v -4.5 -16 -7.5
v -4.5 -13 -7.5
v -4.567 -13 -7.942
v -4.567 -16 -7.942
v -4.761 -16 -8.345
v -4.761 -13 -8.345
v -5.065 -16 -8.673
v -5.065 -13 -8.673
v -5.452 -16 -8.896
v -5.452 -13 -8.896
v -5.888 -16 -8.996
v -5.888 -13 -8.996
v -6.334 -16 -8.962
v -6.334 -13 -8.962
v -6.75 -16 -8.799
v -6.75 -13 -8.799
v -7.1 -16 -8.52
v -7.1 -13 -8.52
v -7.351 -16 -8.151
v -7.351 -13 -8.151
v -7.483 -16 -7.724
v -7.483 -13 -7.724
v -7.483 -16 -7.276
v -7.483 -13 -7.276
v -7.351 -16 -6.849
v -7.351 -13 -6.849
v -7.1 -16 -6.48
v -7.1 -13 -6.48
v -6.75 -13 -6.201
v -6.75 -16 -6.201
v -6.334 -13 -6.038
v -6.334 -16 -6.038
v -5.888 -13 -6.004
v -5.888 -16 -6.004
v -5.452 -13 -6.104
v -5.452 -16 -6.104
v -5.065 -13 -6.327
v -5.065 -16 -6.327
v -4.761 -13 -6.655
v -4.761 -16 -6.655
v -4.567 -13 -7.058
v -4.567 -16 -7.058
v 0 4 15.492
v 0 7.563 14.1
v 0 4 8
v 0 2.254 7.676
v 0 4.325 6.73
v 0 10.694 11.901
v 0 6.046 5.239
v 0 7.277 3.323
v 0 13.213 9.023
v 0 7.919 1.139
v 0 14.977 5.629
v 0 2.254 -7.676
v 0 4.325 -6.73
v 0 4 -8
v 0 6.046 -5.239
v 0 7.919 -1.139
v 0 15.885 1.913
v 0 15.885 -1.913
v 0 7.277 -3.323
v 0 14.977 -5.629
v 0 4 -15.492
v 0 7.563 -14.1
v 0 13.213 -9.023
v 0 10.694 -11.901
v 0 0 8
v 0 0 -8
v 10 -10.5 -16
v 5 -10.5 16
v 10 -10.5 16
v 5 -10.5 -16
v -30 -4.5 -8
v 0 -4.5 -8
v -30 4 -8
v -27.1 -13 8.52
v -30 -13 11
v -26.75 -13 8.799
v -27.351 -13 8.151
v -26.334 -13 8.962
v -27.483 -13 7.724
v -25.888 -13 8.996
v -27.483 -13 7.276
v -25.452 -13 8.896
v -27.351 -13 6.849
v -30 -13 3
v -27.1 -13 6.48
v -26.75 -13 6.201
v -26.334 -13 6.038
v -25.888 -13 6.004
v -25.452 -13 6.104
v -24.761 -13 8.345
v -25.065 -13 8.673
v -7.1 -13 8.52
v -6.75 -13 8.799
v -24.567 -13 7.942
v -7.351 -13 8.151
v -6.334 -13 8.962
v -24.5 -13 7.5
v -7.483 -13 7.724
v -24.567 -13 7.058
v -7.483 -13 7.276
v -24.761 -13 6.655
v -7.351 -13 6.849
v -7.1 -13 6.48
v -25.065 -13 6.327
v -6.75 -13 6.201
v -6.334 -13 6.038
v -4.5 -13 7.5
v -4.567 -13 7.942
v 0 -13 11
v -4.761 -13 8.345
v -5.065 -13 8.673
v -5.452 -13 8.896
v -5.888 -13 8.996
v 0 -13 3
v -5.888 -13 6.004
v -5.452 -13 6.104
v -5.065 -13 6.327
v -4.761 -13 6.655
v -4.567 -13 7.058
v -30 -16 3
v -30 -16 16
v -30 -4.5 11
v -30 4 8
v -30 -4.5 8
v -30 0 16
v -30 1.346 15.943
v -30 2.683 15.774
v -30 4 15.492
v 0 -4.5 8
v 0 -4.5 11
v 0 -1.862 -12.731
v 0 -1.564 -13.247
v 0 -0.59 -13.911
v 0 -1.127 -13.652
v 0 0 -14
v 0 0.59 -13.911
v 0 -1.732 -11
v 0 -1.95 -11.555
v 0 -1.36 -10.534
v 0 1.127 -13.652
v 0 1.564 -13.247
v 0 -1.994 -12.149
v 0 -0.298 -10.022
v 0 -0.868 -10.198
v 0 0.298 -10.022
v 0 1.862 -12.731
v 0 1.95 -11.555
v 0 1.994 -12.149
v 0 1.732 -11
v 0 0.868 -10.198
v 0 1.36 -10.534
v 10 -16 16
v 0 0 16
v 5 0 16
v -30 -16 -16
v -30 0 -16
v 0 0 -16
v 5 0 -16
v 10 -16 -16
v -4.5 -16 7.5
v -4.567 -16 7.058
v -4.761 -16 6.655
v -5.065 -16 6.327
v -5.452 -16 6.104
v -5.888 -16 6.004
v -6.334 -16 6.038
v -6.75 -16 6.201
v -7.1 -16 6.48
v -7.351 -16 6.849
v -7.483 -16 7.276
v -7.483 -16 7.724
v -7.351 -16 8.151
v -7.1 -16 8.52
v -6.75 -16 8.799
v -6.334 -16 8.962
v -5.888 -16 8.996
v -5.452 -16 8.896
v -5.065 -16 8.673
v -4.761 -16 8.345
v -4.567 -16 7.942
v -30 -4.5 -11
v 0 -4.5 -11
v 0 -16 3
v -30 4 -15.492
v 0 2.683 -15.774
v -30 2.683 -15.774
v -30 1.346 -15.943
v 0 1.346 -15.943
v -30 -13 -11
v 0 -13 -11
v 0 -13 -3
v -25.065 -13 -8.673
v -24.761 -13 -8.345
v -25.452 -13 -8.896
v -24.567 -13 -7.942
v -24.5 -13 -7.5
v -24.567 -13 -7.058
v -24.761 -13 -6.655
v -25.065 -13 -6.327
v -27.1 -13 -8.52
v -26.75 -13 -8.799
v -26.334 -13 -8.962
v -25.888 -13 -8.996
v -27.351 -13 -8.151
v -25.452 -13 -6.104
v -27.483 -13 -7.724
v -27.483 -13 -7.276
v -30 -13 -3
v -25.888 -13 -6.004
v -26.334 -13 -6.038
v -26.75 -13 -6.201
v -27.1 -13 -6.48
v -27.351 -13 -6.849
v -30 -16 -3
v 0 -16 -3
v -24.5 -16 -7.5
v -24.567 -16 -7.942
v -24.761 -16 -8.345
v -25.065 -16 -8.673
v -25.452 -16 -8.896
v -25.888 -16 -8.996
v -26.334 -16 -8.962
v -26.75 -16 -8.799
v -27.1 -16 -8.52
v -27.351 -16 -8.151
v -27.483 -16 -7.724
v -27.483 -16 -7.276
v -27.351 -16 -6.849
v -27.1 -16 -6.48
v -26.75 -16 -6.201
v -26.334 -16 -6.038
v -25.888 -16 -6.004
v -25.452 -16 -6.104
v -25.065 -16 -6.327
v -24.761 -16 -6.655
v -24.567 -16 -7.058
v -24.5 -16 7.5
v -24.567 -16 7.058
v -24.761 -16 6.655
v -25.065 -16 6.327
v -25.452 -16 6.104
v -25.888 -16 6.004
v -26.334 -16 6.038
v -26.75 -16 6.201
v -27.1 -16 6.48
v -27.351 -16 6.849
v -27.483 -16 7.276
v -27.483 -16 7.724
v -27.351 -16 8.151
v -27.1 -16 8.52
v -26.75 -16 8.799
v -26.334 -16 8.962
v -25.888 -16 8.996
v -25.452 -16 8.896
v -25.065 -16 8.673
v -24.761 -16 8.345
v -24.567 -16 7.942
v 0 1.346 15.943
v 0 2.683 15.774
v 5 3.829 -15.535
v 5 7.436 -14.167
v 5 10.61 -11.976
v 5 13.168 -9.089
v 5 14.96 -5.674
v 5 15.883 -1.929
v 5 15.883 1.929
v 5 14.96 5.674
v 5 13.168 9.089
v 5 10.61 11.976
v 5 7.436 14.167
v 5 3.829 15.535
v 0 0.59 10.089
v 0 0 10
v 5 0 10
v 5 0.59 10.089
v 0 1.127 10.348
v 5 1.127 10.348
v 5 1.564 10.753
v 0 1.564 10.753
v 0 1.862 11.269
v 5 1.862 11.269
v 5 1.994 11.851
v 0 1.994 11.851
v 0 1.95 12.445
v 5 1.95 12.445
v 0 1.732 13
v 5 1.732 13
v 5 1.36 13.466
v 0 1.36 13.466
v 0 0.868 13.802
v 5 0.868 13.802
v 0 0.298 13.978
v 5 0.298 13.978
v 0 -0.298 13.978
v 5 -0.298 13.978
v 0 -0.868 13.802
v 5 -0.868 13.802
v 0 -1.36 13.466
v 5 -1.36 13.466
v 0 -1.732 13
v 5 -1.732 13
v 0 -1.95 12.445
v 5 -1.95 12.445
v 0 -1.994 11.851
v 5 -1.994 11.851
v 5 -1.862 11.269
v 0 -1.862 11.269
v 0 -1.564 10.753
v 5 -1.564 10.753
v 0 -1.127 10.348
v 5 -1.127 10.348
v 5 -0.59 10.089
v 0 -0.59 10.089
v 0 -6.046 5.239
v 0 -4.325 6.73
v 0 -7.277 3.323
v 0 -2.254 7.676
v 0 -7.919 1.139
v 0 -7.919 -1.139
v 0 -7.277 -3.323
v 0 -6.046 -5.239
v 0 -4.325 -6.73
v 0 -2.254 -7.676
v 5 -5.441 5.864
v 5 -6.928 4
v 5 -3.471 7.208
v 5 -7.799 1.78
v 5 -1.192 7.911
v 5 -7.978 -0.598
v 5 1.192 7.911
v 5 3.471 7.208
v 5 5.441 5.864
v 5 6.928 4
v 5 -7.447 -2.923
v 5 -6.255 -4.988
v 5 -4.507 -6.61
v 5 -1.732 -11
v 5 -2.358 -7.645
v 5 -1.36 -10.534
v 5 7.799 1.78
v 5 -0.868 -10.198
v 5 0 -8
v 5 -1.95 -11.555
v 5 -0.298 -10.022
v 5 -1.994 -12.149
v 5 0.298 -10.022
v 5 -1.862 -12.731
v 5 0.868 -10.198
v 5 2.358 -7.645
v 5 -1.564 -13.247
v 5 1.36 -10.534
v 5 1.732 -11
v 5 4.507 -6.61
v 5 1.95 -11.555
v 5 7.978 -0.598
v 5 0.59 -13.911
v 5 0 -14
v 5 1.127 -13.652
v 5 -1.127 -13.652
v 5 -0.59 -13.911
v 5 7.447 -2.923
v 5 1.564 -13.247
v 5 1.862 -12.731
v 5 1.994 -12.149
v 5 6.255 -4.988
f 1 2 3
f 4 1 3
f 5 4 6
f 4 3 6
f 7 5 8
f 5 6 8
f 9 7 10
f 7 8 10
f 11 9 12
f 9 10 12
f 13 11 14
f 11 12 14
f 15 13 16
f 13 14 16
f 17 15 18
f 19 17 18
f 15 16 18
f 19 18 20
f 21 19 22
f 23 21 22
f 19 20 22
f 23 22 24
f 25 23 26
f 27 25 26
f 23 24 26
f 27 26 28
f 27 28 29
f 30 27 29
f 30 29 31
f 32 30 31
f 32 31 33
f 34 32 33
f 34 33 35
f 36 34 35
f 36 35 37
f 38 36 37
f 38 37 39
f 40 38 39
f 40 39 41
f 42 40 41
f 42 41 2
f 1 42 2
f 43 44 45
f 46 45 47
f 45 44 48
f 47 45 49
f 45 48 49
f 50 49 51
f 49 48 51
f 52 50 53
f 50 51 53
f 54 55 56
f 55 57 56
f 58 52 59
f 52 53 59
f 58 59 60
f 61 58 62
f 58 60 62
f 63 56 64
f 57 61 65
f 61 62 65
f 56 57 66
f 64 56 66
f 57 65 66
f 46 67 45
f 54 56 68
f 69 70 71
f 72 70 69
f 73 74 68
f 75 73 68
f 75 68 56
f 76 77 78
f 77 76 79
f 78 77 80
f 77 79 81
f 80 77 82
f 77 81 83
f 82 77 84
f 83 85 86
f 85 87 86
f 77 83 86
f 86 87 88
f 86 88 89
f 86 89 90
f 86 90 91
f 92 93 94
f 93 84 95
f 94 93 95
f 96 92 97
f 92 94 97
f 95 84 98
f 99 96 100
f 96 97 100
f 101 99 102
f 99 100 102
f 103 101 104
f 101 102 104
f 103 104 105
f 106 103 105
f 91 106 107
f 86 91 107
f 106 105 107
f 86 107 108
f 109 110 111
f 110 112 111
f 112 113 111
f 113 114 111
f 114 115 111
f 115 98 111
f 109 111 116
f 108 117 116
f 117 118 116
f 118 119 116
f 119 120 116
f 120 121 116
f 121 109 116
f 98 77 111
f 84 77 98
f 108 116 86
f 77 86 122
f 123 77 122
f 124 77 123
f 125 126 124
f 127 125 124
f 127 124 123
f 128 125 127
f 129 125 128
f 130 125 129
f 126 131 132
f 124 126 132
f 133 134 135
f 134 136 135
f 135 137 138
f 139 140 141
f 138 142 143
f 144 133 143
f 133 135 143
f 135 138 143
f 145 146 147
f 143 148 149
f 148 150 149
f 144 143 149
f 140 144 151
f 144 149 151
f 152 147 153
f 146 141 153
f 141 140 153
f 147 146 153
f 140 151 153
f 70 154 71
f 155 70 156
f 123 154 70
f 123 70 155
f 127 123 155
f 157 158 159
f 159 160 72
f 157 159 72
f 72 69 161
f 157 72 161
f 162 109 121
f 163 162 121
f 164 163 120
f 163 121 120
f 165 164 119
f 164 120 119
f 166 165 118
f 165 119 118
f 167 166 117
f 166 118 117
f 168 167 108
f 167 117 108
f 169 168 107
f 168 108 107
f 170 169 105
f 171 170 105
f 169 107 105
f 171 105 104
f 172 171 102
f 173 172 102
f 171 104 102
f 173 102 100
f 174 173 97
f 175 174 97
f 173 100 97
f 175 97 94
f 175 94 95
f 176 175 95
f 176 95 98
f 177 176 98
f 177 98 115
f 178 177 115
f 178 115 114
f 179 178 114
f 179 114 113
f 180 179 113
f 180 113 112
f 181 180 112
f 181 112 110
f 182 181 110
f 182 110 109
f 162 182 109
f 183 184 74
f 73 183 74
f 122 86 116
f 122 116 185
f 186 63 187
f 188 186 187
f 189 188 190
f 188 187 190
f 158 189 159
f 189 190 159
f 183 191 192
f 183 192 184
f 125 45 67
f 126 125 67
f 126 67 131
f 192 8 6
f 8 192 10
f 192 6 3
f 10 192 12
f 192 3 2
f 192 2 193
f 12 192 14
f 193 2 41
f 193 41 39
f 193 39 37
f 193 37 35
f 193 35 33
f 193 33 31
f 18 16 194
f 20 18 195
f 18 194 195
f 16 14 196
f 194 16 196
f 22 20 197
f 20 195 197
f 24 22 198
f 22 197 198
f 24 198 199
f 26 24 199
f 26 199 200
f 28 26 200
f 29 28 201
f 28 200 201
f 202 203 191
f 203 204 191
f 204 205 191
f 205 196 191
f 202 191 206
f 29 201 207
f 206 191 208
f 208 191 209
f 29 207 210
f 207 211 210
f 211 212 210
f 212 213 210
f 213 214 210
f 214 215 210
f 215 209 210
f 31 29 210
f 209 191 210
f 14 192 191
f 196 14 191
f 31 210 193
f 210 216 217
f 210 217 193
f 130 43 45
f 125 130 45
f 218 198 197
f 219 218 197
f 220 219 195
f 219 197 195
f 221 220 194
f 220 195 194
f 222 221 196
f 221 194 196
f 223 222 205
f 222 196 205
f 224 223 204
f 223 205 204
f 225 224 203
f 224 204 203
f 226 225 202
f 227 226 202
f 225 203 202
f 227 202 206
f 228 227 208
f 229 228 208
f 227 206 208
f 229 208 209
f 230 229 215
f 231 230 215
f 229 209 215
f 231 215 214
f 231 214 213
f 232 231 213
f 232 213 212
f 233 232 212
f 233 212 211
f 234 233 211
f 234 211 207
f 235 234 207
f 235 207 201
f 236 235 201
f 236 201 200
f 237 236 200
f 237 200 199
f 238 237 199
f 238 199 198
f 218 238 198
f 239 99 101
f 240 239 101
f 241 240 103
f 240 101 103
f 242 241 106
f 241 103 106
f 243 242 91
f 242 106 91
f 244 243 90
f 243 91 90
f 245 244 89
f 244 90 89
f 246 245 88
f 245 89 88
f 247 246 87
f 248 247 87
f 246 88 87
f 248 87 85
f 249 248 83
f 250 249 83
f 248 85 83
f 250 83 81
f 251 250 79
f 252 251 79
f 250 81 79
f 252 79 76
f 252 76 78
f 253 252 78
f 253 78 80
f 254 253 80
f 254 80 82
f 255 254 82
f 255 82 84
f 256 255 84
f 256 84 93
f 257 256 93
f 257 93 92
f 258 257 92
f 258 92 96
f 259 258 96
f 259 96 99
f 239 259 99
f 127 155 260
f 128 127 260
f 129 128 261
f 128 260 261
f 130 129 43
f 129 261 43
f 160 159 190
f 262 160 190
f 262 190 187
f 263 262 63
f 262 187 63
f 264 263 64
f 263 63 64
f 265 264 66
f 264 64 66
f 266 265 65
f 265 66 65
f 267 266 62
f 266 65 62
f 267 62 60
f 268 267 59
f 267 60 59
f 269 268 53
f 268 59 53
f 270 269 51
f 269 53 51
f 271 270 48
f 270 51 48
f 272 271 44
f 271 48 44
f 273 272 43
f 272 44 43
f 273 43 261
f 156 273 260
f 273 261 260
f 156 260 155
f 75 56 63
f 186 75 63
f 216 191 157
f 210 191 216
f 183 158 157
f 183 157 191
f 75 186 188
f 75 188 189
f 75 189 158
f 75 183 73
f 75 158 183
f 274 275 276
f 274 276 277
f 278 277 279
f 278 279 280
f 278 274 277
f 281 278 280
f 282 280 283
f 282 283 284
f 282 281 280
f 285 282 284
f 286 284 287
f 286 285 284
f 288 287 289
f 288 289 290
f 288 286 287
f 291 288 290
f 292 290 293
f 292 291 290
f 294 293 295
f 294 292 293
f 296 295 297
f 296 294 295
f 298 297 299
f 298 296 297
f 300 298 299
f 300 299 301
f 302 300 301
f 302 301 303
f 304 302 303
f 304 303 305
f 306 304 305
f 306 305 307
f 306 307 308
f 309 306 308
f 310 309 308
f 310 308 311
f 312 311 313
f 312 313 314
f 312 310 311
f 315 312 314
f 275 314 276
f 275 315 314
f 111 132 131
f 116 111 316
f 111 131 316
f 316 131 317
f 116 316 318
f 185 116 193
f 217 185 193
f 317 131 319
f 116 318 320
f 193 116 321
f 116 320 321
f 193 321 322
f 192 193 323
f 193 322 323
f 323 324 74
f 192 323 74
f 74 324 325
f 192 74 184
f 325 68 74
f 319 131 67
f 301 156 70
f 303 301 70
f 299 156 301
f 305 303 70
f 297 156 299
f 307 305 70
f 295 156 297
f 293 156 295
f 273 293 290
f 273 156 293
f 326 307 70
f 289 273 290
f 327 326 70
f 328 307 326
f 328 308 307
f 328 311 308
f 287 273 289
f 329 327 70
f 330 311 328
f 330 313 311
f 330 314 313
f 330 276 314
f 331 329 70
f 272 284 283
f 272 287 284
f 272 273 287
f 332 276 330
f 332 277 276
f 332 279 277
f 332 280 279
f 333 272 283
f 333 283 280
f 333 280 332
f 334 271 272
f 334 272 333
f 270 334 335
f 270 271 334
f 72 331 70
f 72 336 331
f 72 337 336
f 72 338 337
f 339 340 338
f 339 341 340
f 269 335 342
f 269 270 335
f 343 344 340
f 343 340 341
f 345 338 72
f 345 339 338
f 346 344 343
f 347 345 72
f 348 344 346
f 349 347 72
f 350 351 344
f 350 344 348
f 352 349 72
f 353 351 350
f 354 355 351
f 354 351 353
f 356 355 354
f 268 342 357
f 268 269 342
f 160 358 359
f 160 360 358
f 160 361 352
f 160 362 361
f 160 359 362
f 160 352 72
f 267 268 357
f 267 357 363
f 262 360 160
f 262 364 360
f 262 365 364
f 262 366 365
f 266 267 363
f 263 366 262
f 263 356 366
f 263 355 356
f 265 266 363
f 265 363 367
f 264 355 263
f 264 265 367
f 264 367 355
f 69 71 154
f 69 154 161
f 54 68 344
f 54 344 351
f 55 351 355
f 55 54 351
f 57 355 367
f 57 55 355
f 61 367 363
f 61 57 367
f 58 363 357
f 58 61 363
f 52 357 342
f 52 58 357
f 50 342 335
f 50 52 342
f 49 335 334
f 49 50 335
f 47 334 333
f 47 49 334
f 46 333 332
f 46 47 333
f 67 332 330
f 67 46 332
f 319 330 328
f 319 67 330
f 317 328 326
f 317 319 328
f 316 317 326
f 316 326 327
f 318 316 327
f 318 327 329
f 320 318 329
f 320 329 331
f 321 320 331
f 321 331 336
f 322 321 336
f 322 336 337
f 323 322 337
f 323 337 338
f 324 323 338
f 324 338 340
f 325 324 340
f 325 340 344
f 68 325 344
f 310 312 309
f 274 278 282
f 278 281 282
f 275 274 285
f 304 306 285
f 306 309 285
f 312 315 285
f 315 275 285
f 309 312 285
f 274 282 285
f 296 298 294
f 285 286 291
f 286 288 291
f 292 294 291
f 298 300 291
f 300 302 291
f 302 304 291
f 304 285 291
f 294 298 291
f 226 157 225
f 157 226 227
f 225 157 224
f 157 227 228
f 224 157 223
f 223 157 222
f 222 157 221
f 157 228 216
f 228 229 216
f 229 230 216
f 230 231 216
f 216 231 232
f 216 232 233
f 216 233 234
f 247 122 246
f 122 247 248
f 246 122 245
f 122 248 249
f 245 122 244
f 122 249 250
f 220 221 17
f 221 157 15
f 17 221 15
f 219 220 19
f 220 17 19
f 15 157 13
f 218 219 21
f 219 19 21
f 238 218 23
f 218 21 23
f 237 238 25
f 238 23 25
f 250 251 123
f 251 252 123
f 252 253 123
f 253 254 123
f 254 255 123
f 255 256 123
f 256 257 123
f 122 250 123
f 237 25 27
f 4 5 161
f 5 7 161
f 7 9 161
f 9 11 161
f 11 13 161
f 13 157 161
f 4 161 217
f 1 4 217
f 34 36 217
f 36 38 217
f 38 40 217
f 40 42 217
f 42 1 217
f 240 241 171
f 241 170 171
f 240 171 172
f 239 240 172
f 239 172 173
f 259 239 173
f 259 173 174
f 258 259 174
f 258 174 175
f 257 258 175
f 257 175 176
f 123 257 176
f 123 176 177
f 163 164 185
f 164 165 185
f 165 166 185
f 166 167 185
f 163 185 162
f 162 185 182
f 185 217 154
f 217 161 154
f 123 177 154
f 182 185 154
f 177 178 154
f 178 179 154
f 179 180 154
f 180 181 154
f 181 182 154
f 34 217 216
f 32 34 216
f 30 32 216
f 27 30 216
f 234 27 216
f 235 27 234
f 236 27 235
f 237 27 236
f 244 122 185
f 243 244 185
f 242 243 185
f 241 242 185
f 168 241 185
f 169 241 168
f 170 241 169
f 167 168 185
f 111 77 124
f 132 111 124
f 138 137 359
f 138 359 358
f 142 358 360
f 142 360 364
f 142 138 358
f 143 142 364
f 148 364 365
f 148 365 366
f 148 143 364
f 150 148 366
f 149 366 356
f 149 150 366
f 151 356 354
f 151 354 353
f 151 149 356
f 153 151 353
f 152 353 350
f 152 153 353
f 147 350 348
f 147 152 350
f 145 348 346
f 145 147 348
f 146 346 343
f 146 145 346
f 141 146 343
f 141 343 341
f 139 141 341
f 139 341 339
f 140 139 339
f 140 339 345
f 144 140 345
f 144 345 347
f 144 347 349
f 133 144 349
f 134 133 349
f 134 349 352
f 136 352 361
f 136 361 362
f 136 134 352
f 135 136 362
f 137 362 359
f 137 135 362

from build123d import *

# Parameters (mm, degrees)
SKETCH_1_R          = 8
SKETCH_1_R_2        = 2
EXTRUDE_1_DEPTH     = 5
SKETCH_3_W          = 32
SKETCH_3_H          = 5.5
EXTRUDE_3_DEPTH     = 5
EXTRUDE_4_DEPTH     = 30
SKETCH_6_R          = 1.5
CUT_EXTRUDE_1_DEPTH = 20
SKETCH_7_W          = 3
SKETCH_7_H          = 8.5
CUT_EXTRUDE_5_DEPTH = 30


with BuildPart() as part:
    # 草图1 → 凸台-拉伸1 (new body)
    with BuildSketch(Plane(origin=(0, 0, 0), x_dir=(0, 0, -1), z_dir=(1, 0, 0))):
        with BuildLine():
            Line((-16, 0), (-16, -16))
            Line((-16, -16), (16, -16))
            Line((16, -16), (16, 0))
            ThreePointArc((16, 0), (0, 16), (-16, 0))
        make_face()
        Circle(SKETCH_1_R, mode=Mode.SUBTRACT)
        with Locations((-12, 0)):
            Circle(SKETCH_1_R_2, mode=Mode.SUBTRACT)
        with Locations((12, 0)):
            Circle(SKETCH_1_R_2, mode=Mode.SUBTRACT)
    extrude(amount=EXTRUDE_1_DEPTH)

    # 草图3 → 凸台-拉伸3 (add)
    with BuildSketch(Plane(origin=(5, 0, 0), x_dir=(0, 0, -1), z_dir=(1, 0, 0))):
        with Locations((0, -13.25)):
            Rectangle(SKETCH_3_W, SKETCH_3_H)
    extrude(amount=EXTRUDE_3_DEPTH)

    # 草图4 → 凸台-拉伸4 (add)
    with BuildSketch(Plane.ZY):
        with BuildLine():
            Line((-8, 4), (-15.491933385, 4))
            ThreePointArc((-15.491933385, 4), (-15.87247514, 2.01606868), (-16, 0))
            Line((-16, 0), (-16, -16))
            Line((-16, -16), (-3, -16))
            Line((-3, -16), (-3, -13))
            Line((-3, -13), (-8, -13))
            Line((-8, -13), (-8, 4))
        make_face()
        with BuildLine():
            Line((3, -13), (3, -16))
            Line((3, -16), (16, -16))
            Line((16, -16), (16, 0))
            ThreePointArc((16, 0), (15.87247514, 2.01606868), (15.491933385, 4))
            Line((15.491933385, 4), (8, 4))
            Line((8, 4), (8, -13))
            Line((8, -13), (3, -13))
        make_face()
    extrude(amount=EXTRUDE_4_DEPTH)

    # 草图6 → 切除-拉伸1 (cut)
    with BuildSketch(Plane(origin=(0, -13, 0), x_dir=(1, 0, 0), z_dir=(0, 1, 0))):
        with Locations((-6, -7.5)):
            Circle(SKETCH_6_R)
        with Locations((-6, 7.5)):
            Circle(SKETCH_6_R)
        with Locations((-26, 7.5)):
            Circle(SKETCH_6_R)
        with Locations((-26, -7.5)):
            Circle(SKETCH_6_R)
    extrude(amount=-CUT_EXTRUDE_1_DEPTH, mode=Mode.SUBTRACT)

    # 草图7 → 切除-拉伸5 (cut)
    with BuildSketch(Plane.ZY.offset(30)):
        with Locations((-9.5, -8.75)):
            Rectangle(SKETCH_7_W, SKETCH_7_H)
        with Locations((9.5, -8.75)):
            Rectangle(SKETCH_7_W, SKETCH_7_H)
    extrude(amount=-CUT_EXTRUDE_5_DEPTH, mode=Mode.SUBTRACT)


solid = part.part
